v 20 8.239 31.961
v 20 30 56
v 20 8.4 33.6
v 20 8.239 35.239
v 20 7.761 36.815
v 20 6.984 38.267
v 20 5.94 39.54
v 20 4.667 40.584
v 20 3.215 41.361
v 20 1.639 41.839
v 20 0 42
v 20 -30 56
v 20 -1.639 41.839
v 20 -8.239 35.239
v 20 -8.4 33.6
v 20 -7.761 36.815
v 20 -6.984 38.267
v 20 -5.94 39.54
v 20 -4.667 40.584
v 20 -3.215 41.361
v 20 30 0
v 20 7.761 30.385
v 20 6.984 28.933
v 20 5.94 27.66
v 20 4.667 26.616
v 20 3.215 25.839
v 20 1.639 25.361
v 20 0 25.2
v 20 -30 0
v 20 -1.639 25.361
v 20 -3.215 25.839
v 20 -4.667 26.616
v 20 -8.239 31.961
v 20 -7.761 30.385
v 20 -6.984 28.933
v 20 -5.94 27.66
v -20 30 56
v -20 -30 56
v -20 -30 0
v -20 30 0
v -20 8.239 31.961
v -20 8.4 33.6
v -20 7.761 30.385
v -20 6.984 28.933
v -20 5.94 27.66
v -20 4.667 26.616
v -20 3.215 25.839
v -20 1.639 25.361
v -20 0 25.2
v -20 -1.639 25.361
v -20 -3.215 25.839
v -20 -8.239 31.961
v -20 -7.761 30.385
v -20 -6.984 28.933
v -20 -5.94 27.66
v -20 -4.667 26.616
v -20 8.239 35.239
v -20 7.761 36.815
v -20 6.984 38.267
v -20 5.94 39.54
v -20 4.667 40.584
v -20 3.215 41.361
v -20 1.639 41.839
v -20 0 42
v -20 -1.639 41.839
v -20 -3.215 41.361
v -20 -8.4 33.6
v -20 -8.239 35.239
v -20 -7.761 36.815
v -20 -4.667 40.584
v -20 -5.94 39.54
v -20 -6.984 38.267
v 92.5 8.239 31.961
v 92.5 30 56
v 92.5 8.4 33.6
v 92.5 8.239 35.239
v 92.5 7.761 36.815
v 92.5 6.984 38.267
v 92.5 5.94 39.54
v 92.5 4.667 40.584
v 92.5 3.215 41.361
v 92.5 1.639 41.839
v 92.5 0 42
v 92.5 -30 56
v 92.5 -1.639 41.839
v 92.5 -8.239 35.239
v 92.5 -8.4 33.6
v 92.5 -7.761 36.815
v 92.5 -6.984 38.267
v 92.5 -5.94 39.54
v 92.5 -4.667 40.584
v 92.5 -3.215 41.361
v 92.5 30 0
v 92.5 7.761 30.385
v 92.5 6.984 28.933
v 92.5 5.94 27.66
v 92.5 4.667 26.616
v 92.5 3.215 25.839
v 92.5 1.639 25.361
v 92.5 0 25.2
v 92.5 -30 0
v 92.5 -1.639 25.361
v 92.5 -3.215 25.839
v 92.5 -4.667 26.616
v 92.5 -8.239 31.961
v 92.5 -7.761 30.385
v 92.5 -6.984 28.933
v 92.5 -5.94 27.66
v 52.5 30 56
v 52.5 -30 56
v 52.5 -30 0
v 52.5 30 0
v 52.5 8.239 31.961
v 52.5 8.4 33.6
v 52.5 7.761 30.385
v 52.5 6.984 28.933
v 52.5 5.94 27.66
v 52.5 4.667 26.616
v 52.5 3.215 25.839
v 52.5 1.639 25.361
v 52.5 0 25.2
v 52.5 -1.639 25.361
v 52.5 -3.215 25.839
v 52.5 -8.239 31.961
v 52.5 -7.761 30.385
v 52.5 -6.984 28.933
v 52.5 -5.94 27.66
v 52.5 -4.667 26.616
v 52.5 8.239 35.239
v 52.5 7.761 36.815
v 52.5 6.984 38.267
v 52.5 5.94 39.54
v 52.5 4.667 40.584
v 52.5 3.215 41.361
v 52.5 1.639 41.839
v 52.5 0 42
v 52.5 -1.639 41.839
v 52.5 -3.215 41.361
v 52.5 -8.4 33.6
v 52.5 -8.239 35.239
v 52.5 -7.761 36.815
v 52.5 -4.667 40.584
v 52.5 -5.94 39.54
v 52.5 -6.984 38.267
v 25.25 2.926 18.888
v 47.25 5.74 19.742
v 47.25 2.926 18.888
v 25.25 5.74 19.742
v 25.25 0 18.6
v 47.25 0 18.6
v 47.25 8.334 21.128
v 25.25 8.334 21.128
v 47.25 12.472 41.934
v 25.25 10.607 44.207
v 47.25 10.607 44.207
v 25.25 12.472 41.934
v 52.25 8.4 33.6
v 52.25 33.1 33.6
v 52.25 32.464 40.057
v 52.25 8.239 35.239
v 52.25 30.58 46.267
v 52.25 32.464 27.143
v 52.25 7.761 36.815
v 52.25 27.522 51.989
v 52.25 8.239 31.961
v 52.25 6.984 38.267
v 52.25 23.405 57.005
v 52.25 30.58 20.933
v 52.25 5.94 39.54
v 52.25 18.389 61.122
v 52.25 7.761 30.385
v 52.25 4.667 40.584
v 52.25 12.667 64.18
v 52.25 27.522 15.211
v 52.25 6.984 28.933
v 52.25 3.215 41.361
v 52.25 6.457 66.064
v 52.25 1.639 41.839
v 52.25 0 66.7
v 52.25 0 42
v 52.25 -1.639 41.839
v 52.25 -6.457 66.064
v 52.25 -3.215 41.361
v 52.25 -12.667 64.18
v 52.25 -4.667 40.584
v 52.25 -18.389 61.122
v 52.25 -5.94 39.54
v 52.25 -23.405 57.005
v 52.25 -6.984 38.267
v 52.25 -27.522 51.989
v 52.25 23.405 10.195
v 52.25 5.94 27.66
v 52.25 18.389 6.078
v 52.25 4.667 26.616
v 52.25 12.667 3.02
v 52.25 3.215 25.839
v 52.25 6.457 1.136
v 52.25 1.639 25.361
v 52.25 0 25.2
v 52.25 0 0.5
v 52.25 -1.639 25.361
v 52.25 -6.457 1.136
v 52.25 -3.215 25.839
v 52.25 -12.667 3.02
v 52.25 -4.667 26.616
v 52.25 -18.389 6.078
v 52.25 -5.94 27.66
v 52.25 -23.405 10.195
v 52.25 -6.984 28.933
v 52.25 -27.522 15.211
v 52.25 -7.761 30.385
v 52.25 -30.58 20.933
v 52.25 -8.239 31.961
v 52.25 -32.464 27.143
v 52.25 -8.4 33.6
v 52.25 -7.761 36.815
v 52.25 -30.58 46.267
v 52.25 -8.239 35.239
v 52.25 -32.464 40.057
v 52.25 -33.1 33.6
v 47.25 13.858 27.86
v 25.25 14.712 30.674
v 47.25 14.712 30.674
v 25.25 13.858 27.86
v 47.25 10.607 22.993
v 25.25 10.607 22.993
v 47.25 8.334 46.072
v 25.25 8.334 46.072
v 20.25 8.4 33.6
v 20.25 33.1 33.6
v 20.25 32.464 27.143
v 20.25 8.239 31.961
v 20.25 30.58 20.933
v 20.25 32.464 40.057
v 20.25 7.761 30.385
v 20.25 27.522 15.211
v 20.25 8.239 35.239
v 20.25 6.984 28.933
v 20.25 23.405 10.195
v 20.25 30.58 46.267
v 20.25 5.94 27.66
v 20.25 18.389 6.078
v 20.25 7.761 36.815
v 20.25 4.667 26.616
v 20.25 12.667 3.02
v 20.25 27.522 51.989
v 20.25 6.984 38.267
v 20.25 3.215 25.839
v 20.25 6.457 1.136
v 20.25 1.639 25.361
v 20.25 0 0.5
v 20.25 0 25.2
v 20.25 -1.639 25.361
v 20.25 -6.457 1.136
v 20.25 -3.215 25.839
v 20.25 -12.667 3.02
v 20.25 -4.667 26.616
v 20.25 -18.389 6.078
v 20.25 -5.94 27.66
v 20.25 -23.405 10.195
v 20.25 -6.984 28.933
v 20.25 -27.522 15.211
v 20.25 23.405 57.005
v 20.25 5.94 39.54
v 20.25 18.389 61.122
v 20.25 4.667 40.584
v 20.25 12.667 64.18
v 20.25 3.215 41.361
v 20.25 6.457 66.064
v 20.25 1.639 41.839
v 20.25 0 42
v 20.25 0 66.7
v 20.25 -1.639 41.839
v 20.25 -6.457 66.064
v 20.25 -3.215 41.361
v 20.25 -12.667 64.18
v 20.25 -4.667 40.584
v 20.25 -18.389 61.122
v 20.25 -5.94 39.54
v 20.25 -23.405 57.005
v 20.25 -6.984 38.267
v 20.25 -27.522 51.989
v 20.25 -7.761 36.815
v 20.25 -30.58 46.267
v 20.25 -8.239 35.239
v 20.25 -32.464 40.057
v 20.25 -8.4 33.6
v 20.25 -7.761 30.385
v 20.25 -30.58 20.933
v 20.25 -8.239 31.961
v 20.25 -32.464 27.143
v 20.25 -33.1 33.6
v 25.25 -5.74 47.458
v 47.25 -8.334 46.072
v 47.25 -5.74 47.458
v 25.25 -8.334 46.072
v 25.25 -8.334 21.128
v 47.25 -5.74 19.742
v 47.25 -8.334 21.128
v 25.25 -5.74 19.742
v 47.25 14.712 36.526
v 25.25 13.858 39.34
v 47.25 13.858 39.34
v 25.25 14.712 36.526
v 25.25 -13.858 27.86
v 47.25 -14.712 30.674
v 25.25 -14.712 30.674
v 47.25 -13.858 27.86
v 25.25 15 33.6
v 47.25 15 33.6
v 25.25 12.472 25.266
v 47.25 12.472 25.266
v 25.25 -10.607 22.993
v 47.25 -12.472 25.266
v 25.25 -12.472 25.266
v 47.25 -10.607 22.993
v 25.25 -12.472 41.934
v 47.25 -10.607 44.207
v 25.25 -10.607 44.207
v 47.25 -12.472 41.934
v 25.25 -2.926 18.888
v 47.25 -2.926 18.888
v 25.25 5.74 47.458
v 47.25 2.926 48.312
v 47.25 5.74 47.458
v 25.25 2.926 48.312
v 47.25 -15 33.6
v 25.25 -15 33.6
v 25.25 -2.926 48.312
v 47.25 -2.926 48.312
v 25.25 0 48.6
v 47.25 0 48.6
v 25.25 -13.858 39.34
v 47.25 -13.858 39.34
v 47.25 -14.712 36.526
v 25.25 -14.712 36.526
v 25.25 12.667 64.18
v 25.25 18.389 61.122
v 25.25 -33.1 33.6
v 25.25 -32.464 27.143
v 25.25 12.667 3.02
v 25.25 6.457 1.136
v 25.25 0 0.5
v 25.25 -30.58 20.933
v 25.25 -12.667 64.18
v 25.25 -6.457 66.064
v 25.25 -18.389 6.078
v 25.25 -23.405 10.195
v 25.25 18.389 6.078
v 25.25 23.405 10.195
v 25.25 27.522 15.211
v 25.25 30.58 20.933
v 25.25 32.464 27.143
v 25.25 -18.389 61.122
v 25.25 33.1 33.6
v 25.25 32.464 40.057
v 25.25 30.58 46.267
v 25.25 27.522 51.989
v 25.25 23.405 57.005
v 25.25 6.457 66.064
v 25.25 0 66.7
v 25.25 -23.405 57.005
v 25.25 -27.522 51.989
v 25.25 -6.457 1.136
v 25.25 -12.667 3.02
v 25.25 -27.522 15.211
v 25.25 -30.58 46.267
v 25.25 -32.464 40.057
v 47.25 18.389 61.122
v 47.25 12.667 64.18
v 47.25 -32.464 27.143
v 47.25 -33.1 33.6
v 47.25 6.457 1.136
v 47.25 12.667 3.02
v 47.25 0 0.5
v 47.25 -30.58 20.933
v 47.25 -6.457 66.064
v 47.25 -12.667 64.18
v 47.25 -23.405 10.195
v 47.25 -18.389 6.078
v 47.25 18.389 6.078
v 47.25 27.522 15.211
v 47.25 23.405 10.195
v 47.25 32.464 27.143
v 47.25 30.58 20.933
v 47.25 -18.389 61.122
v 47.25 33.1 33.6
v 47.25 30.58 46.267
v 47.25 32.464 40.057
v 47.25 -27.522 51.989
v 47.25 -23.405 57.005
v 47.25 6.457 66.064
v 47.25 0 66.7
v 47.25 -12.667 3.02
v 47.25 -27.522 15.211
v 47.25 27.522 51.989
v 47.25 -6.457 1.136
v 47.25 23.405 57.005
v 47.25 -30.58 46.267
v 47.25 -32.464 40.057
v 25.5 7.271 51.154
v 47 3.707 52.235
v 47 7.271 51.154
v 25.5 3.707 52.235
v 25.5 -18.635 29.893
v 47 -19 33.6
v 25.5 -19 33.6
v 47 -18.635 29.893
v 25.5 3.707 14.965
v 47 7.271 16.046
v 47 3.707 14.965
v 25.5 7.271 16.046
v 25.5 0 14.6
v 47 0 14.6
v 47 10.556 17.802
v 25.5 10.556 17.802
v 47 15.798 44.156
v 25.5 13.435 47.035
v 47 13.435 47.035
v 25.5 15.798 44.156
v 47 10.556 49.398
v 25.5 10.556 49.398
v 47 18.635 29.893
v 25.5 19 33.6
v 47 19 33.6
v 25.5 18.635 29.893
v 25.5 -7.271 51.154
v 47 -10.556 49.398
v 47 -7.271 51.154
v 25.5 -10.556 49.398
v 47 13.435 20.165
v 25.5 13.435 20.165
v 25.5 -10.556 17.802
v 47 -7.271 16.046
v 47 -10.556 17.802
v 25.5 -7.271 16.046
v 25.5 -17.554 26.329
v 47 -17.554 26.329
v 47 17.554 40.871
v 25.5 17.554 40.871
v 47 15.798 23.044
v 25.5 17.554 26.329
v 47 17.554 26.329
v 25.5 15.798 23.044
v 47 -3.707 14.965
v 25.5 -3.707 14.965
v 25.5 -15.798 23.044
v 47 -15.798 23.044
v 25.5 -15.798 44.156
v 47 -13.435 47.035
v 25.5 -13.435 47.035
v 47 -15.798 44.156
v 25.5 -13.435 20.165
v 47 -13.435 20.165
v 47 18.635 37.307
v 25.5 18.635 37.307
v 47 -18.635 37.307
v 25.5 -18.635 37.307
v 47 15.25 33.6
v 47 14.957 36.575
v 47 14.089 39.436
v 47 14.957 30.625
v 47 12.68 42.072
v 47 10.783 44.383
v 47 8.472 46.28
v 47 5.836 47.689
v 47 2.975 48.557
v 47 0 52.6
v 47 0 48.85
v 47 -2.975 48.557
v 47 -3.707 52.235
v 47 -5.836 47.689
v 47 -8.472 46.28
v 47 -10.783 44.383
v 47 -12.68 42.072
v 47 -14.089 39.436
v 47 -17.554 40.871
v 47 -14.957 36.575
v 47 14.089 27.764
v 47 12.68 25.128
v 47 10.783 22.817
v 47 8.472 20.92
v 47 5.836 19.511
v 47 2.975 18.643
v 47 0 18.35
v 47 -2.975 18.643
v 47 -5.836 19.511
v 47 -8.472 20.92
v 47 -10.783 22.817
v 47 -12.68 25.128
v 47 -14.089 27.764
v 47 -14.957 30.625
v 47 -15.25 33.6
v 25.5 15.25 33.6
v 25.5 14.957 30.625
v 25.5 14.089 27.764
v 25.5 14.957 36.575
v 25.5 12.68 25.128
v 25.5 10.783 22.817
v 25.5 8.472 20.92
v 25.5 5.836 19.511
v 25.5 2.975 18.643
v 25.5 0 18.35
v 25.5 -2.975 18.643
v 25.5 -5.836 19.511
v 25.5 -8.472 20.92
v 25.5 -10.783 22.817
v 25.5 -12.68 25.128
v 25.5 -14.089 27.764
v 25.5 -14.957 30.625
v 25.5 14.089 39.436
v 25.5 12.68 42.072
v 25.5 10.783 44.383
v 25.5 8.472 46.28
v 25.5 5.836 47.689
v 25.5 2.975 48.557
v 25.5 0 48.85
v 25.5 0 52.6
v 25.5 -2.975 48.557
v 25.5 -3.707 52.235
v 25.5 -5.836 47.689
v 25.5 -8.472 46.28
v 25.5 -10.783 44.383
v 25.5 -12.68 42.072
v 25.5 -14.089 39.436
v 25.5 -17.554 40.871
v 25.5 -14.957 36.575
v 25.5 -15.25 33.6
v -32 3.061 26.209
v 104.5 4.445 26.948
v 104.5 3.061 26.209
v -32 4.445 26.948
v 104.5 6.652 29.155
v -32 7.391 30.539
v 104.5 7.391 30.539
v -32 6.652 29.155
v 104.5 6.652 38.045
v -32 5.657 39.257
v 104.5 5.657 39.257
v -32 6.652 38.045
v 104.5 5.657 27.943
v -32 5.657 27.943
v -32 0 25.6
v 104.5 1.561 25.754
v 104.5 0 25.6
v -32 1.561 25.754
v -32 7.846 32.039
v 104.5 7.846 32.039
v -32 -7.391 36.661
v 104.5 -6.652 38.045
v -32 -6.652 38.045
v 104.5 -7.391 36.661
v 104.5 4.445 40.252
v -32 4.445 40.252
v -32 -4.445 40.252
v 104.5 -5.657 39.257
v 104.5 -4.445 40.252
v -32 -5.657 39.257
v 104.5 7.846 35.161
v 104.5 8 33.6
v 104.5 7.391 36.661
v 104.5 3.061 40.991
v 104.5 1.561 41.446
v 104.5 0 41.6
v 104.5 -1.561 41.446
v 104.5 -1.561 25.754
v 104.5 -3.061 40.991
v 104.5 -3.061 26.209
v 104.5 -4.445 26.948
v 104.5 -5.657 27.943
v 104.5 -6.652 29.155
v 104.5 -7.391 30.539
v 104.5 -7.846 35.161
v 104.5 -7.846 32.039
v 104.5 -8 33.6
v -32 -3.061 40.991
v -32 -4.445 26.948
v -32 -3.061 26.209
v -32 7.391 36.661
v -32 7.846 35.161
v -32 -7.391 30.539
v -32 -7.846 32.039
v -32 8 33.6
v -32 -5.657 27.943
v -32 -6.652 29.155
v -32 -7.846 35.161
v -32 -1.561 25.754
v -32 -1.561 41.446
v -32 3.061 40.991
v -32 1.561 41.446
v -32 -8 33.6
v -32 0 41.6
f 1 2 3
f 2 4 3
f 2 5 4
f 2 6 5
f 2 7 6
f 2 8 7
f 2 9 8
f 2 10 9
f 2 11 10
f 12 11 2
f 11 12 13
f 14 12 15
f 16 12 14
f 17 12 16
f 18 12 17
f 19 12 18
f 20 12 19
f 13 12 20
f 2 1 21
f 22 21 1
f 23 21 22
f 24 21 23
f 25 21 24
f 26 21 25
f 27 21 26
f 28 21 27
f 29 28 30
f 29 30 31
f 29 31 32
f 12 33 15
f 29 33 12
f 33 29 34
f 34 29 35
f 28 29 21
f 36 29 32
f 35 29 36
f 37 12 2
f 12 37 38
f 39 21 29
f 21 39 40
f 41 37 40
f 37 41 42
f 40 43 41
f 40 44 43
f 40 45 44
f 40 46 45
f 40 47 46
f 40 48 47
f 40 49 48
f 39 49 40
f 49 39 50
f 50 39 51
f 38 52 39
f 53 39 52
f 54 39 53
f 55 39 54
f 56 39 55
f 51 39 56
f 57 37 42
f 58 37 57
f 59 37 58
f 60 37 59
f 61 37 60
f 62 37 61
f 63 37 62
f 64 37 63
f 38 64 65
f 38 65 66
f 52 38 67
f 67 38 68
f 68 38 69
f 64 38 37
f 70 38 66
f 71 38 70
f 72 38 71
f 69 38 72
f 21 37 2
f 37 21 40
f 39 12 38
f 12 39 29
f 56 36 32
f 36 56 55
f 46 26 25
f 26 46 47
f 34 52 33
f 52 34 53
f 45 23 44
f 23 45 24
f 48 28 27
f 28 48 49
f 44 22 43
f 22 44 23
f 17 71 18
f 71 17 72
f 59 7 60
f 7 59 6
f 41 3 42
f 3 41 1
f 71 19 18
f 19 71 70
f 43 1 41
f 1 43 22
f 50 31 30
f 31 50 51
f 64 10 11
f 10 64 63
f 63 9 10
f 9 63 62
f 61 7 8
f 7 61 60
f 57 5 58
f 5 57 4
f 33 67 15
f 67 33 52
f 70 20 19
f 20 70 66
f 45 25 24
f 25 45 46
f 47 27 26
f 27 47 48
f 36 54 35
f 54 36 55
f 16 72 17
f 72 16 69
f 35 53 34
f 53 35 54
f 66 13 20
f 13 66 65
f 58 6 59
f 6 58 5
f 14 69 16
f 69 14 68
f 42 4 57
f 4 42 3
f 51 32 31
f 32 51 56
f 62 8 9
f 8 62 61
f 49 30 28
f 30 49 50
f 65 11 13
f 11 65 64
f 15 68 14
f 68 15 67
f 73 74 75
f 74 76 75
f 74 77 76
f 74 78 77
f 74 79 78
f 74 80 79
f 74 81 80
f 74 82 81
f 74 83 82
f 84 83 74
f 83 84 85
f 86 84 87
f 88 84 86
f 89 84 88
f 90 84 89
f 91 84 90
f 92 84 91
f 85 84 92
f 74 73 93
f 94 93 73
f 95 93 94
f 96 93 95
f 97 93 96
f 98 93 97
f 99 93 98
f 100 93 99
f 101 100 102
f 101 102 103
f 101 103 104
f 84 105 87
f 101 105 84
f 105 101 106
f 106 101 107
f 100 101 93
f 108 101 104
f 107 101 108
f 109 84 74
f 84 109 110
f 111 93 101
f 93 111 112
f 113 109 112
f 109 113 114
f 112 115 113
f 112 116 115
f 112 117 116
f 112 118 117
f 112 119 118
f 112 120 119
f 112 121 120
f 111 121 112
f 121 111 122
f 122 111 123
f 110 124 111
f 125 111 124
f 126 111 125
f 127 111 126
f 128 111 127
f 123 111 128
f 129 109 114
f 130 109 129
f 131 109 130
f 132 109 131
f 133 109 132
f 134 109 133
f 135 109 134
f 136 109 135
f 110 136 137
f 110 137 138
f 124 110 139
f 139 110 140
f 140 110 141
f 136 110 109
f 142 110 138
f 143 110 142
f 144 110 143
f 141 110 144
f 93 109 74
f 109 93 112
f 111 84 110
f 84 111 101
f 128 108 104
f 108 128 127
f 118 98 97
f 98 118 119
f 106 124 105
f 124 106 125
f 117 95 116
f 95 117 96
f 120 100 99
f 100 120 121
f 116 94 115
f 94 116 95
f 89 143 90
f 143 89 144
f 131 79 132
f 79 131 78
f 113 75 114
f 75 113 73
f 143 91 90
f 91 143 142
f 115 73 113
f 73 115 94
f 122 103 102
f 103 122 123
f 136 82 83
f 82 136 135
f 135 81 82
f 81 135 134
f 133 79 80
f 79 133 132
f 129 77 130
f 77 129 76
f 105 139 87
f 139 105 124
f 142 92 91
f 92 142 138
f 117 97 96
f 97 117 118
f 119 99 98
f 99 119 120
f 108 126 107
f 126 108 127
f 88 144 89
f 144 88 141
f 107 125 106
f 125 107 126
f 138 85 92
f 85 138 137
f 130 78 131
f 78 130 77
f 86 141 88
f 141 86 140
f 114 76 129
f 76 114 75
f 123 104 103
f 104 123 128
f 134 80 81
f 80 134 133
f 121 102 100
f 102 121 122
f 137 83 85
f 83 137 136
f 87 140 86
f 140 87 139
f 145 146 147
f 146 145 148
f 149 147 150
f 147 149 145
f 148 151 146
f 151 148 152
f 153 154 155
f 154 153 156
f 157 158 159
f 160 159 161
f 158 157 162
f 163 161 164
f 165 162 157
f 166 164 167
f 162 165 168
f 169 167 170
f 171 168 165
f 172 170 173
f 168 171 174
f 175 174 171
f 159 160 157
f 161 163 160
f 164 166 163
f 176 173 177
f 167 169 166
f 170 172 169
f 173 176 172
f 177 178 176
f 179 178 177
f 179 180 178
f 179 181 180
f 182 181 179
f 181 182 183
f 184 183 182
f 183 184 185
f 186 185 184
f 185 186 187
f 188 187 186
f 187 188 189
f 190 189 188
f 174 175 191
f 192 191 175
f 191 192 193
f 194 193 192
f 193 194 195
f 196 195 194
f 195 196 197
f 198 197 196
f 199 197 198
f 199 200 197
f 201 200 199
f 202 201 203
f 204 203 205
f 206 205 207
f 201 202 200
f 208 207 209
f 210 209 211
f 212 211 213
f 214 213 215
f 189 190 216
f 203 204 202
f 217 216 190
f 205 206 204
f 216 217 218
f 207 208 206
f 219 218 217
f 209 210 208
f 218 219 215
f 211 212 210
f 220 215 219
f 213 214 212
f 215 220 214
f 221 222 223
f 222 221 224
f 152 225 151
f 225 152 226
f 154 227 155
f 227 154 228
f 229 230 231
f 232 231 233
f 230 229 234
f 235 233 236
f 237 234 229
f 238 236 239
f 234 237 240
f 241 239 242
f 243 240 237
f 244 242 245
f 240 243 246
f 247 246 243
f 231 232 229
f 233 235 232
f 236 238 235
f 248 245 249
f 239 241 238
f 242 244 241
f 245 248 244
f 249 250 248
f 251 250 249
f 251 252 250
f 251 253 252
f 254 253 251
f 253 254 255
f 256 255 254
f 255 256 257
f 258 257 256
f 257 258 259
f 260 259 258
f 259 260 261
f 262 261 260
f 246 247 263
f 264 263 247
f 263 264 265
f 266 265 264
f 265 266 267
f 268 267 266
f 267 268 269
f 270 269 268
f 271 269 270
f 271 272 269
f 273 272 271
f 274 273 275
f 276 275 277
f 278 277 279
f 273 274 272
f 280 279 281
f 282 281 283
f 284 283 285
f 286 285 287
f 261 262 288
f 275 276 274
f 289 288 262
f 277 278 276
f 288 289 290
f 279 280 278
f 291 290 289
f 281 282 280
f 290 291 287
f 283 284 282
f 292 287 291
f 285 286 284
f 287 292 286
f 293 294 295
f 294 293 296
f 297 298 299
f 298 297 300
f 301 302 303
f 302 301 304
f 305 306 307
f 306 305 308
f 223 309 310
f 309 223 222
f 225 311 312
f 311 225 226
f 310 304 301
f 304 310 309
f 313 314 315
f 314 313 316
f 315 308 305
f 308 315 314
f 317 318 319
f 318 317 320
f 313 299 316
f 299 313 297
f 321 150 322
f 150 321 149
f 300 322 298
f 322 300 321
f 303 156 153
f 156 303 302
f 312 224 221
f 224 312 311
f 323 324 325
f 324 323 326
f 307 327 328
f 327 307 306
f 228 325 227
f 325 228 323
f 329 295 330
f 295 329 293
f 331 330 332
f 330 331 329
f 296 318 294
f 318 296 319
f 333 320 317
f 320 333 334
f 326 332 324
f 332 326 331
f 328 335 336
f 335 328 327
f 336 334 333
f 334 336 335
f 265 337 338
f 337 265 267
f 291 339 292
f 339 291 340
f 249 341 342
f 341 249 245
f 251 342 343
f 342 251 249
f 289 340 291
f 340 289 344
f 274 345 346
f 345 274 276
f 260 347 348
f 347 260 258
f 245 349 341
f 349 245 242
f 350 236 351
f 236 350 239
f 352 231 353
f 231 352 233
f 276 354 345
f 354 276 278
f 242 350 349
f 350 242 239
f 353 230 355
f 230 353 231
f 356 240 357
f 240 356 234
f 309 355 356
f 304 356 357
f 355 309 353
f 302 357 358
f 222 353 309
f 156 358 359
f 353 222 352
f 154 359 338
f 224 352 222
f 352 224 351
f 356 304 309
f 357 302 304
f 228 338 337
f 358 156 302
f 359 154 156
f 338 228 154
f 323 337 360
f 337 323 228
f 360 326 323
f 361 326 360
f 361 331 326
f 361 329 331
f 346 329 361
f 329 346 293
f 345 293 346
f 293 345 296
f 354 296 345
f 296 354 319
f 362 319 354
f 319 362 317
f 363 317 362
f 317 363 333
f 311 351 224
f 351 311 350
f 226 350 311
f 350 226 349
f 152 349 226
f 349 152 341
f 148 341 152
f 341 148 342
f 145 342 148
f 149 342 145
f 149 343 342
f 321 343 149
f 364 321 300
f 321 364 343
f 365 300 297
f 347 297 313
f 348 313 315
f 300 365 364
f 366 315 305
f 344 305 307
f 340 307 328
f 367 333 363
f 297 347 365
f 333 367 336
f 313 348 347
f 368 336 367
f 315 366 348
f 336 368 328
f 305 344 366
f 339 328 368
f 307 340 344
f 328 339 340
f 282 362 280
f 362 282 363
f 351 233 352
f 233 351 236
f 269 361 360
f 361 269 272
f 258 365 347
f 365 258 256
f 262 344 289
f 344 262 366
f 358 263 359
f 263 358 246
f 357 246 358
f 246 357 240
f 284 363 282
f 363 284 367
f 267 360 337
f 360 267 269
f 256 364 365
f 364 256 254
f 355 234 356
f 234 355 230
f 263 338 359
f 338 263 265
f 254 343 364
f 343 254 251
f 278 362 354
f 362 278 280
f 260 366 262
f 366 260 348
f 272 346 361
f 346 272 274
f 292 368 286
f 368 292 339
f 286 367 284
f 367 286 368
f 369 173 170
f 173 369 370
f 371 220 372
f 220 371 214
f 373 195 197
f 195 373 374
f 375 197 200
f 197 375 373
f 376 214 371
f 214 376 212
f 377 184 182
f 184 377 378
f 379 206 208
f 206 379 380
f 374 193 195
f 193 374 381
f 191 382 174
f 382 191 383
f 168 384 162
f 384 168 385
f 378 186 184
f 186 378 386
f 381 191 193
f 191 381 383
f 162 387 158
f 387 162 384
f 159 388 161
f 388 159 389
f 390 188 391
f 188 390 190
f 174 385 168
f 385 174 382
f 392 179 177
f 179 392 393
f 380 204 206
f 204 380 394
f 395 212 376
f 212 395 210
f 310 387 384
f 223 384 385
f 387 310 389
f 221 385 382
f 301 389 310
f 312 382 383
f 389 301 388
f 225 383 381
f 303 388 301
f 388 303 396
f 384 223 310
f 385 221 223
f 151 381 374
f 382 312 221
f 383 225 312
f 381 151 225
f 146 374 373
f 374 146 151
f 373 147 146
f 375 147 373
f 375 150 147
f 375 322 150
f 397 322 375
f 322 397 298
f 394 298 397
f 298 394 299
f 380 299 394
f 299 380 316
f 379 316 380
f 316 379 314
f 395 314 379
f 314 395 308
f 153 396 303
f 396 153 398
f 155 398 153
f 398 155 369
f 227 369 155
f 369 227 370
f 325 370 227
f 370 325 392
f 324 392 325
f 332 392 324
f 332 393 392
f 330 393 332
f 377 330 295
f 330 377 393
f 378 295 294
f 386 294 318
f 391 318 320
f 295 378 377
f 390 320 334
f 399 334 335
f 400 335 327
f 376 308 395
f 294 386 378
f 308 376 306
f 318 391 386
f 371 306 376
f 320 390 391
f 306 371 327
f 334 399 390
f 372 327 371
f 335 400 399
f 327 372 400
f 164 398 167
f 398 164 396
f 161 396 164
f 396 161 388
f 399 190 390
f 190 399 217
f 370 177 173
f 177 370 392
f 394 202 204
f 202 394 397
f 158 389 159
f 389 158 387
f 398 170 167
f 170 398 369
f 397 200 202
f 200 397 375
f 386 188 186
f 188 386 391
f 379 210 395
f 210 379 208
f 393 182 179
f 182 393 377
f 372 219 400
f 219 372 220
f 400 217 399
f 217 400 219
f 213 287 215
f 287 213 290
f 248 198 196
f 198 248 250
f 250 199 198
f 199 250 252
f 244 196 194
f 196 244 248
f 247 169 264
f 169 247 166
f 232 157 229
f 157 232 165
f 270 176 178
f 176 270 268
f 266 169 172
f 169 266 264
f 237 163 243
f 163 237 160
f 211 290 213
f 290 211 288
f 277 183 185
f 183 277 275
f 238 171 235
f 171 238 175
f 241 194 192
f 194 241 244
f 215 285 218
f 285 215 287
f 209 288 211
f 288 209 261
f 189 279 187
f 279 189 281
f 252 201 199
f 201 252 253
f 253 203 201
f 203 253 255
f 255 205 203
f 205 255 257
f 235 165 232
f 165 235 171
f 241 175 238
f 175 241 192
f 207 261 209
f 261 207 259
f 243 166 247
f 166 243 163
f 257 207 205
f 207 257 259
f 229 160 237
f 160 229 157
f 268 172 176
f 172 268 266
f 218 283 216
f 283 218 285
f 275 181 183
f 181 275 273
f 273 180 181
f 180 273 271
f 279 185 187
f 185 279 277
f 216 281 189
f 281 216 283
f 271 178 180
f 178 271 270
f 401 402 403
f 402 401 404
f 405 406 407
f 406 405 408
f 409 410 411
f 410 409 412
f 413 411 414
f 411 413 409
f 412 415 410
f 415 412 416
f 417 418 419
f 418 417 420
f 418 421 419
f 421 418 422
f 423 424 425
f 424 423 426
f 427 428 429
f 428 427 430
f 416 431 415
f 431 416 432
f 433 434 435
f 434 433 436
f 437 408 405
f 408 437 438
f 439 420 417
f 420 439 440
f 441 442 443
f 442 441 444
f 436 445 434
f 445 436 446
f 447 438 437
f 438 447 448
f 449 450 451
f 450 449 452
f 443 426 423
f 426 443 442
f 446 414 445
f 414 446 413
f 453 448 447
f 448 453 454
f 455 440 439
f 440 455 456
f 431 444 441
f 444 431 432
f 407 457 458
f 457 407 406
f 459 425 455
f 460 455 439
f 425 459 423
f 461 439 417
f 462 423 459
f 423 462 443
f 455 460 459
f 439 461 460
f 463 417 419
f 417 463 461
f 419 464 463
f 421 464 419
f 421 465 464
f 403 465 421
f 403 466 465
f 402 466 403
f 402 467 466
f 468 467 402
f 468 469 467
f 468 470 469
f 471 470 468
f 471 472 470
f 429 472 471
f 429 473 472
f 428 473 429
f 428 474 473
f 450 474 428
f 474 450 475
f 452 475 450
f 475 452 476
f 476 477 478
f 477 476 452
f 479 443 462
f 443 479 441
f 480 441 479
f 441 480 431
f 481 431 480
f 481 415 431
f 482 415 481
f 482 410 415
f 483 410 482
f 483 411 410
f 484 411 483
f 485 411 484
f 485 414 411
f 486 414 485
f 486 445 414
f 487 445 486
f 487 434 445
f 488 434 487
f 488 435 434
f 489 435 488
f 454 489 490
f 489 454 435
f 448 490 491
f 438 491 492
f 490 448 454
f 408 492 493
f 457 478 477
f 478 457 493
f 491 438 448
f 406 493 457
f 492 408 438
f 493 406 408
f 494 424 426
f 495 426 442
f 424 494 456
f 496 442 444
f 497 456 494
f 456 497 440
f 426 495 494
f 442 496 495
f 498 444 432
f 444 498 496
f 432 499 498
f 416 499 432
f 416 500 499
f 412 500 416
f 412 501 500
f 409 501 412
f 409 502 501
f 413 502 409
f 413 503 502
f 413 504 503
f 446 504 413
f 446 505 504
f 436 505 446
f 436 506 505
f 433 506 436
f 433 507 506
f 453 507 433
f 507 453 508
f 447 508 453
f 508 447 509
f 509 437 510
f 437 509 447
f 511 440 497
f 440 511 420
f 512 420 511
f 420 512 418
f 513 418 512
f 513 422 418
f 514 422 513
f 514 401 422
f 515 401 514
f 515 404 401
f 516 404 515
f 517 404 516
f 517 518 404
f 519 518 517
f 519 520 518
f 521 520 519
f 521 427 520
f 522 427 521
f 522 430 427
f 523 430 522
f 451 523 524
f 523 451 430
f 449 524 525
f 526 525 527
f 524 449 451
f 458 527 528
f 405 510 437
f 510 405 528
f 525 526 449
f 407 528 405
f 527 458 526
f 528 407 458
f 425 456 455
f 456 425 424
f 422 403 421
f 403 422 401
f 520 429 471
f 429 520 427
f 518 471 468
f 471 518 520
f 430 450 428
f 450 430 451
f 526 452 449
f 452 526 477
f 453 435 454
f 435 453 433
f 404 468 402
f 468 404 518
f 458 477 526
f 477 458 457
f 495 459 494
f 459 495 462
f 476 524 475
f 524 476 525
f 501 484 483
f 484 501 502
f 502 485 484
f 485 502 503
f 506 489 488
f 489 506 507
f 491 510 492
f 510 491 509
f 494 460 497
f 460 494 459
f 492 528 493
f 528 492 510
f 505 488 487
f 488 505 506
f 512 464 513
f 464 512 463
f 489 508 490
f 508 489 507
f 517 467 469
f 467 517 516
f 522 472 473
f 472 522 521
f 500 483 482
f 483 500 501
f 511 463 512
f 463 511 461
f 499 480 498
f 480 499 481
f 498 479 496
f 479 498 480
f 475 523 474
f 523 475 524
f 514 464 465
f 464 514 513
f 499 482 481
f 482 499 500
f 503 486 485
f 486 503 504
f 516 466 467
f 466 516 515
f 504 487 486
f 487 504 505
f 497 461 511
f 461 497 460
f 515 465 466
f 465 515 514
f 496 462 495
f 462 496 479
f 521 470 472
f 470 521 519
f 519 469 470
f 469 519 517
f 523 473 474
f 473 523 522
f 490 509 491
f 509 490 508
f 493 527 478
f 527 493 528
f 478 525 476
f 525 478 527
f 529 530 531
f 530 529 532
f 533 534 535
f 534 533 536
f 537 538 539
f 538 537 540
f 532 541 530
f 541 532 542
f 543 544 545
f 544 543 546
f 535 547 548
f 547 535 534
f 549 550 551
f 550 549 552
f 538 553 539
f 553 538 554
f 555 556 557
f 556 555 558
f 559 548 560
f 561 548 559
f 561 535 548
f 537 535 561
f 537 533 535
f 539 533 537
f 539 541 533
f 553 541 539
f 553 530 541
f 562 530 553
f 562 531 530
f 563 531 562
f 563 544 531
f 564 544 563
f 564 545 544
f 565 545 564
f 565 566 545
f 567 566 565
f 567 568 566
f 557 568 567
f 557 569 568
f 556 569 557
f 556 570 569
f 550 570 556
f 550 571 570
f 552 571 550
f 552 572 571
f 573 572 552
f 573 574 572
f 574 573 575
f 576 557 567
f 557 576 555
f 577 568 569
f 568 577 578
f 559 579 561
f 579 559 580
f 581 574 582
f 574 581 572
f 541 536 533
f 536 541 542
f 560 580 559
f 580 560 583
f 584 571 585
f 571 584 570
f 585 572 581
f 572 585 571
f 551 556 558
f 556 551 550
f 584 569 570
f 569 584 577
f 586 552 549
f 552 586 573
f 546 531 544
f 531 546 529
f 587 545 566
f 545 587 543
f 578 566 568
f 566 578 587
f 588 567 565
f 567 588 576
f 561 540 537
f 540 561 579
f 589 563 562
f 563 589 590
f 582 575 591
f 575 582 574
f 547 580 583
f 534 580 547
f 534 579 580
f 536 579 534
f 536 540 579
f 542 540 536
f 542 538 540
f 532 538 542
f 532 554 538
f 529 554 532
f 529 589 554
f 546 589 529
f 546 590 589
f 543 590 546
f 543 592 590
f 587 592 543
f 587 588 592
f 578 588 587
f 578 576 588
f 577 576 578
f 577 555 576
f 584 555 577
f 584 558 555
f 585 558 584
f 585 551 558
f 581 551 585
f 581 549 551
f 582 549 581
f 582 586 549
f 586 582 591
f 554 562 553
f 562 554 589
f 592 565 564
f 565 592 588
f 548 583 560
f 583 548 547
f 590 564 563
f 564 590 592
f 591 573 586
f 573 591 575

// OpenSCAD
$fn = 32;

// ------------------------------------------------------------------------
// Pulley assembly: d66.2 pulley with a belt, shaft d16
// Every part is its own module, assembly() places them once.
// ------------------------------------------------------------------------

// --- part 1 ---
module support1() {
  difference() {
    translate([-20, -30, 0]) cube([40, 60, 56]);
    translate([0, 0, 33.6]) rotate([0, 90, 0]) cylinder(h = 42, d = 16.8, center = true);
  }
}

// --- part 2 ---
module support2() {
  difference() {
    translate([-20, -30, 0]) cube([40, 60, 56]);
    translate([0, 0, 33.6]) rotate([0, 90, 0]) cylinder(h = 42, d = 16.8, center = true);
  }
}

// --- part 3 ---
module shaft() {
  translate([0, 0, -68.25]) cylinder(h = 136.5, d = 16);
}

// --- part 4 ---
module pulley() {
  difference() {
    union() {
      cylinder(h = 32, d = 30);
      cylinder(h = 5, d = 66.2);
      translate([0, 0, 27]) cylinder(h = 5, d = 66.2);
    }
    translate([0, 0, -1]) cylinder(h = 34, d = 16.8);
  }
}

// --- part 5 ---
module belt() {
  difference() {
      translate([0, 0, 0]) cylinder(h = 21.5, d = 38);
      translate([0, 0, -1]) cylinder(h = 23.5, d = 30.5);
    }
}

// --- assembly ---
module assembly() {
  translate([0, 0, 0]) rotate([0, 0, 0]) support1();
  translate([72.5, 0, 0]) rotate([0, 0, 0]) support2();
  translate([36.25, 0, 33.6]) rotate([0, 90, 0]) shaft();
  translate([20.25, 0, 33.6]) rotate([0, 90, 0]) pulley();
  translate([25.5, 0, 33.6]) rotate([0, 90, 0]) belt();
}

assembly();
